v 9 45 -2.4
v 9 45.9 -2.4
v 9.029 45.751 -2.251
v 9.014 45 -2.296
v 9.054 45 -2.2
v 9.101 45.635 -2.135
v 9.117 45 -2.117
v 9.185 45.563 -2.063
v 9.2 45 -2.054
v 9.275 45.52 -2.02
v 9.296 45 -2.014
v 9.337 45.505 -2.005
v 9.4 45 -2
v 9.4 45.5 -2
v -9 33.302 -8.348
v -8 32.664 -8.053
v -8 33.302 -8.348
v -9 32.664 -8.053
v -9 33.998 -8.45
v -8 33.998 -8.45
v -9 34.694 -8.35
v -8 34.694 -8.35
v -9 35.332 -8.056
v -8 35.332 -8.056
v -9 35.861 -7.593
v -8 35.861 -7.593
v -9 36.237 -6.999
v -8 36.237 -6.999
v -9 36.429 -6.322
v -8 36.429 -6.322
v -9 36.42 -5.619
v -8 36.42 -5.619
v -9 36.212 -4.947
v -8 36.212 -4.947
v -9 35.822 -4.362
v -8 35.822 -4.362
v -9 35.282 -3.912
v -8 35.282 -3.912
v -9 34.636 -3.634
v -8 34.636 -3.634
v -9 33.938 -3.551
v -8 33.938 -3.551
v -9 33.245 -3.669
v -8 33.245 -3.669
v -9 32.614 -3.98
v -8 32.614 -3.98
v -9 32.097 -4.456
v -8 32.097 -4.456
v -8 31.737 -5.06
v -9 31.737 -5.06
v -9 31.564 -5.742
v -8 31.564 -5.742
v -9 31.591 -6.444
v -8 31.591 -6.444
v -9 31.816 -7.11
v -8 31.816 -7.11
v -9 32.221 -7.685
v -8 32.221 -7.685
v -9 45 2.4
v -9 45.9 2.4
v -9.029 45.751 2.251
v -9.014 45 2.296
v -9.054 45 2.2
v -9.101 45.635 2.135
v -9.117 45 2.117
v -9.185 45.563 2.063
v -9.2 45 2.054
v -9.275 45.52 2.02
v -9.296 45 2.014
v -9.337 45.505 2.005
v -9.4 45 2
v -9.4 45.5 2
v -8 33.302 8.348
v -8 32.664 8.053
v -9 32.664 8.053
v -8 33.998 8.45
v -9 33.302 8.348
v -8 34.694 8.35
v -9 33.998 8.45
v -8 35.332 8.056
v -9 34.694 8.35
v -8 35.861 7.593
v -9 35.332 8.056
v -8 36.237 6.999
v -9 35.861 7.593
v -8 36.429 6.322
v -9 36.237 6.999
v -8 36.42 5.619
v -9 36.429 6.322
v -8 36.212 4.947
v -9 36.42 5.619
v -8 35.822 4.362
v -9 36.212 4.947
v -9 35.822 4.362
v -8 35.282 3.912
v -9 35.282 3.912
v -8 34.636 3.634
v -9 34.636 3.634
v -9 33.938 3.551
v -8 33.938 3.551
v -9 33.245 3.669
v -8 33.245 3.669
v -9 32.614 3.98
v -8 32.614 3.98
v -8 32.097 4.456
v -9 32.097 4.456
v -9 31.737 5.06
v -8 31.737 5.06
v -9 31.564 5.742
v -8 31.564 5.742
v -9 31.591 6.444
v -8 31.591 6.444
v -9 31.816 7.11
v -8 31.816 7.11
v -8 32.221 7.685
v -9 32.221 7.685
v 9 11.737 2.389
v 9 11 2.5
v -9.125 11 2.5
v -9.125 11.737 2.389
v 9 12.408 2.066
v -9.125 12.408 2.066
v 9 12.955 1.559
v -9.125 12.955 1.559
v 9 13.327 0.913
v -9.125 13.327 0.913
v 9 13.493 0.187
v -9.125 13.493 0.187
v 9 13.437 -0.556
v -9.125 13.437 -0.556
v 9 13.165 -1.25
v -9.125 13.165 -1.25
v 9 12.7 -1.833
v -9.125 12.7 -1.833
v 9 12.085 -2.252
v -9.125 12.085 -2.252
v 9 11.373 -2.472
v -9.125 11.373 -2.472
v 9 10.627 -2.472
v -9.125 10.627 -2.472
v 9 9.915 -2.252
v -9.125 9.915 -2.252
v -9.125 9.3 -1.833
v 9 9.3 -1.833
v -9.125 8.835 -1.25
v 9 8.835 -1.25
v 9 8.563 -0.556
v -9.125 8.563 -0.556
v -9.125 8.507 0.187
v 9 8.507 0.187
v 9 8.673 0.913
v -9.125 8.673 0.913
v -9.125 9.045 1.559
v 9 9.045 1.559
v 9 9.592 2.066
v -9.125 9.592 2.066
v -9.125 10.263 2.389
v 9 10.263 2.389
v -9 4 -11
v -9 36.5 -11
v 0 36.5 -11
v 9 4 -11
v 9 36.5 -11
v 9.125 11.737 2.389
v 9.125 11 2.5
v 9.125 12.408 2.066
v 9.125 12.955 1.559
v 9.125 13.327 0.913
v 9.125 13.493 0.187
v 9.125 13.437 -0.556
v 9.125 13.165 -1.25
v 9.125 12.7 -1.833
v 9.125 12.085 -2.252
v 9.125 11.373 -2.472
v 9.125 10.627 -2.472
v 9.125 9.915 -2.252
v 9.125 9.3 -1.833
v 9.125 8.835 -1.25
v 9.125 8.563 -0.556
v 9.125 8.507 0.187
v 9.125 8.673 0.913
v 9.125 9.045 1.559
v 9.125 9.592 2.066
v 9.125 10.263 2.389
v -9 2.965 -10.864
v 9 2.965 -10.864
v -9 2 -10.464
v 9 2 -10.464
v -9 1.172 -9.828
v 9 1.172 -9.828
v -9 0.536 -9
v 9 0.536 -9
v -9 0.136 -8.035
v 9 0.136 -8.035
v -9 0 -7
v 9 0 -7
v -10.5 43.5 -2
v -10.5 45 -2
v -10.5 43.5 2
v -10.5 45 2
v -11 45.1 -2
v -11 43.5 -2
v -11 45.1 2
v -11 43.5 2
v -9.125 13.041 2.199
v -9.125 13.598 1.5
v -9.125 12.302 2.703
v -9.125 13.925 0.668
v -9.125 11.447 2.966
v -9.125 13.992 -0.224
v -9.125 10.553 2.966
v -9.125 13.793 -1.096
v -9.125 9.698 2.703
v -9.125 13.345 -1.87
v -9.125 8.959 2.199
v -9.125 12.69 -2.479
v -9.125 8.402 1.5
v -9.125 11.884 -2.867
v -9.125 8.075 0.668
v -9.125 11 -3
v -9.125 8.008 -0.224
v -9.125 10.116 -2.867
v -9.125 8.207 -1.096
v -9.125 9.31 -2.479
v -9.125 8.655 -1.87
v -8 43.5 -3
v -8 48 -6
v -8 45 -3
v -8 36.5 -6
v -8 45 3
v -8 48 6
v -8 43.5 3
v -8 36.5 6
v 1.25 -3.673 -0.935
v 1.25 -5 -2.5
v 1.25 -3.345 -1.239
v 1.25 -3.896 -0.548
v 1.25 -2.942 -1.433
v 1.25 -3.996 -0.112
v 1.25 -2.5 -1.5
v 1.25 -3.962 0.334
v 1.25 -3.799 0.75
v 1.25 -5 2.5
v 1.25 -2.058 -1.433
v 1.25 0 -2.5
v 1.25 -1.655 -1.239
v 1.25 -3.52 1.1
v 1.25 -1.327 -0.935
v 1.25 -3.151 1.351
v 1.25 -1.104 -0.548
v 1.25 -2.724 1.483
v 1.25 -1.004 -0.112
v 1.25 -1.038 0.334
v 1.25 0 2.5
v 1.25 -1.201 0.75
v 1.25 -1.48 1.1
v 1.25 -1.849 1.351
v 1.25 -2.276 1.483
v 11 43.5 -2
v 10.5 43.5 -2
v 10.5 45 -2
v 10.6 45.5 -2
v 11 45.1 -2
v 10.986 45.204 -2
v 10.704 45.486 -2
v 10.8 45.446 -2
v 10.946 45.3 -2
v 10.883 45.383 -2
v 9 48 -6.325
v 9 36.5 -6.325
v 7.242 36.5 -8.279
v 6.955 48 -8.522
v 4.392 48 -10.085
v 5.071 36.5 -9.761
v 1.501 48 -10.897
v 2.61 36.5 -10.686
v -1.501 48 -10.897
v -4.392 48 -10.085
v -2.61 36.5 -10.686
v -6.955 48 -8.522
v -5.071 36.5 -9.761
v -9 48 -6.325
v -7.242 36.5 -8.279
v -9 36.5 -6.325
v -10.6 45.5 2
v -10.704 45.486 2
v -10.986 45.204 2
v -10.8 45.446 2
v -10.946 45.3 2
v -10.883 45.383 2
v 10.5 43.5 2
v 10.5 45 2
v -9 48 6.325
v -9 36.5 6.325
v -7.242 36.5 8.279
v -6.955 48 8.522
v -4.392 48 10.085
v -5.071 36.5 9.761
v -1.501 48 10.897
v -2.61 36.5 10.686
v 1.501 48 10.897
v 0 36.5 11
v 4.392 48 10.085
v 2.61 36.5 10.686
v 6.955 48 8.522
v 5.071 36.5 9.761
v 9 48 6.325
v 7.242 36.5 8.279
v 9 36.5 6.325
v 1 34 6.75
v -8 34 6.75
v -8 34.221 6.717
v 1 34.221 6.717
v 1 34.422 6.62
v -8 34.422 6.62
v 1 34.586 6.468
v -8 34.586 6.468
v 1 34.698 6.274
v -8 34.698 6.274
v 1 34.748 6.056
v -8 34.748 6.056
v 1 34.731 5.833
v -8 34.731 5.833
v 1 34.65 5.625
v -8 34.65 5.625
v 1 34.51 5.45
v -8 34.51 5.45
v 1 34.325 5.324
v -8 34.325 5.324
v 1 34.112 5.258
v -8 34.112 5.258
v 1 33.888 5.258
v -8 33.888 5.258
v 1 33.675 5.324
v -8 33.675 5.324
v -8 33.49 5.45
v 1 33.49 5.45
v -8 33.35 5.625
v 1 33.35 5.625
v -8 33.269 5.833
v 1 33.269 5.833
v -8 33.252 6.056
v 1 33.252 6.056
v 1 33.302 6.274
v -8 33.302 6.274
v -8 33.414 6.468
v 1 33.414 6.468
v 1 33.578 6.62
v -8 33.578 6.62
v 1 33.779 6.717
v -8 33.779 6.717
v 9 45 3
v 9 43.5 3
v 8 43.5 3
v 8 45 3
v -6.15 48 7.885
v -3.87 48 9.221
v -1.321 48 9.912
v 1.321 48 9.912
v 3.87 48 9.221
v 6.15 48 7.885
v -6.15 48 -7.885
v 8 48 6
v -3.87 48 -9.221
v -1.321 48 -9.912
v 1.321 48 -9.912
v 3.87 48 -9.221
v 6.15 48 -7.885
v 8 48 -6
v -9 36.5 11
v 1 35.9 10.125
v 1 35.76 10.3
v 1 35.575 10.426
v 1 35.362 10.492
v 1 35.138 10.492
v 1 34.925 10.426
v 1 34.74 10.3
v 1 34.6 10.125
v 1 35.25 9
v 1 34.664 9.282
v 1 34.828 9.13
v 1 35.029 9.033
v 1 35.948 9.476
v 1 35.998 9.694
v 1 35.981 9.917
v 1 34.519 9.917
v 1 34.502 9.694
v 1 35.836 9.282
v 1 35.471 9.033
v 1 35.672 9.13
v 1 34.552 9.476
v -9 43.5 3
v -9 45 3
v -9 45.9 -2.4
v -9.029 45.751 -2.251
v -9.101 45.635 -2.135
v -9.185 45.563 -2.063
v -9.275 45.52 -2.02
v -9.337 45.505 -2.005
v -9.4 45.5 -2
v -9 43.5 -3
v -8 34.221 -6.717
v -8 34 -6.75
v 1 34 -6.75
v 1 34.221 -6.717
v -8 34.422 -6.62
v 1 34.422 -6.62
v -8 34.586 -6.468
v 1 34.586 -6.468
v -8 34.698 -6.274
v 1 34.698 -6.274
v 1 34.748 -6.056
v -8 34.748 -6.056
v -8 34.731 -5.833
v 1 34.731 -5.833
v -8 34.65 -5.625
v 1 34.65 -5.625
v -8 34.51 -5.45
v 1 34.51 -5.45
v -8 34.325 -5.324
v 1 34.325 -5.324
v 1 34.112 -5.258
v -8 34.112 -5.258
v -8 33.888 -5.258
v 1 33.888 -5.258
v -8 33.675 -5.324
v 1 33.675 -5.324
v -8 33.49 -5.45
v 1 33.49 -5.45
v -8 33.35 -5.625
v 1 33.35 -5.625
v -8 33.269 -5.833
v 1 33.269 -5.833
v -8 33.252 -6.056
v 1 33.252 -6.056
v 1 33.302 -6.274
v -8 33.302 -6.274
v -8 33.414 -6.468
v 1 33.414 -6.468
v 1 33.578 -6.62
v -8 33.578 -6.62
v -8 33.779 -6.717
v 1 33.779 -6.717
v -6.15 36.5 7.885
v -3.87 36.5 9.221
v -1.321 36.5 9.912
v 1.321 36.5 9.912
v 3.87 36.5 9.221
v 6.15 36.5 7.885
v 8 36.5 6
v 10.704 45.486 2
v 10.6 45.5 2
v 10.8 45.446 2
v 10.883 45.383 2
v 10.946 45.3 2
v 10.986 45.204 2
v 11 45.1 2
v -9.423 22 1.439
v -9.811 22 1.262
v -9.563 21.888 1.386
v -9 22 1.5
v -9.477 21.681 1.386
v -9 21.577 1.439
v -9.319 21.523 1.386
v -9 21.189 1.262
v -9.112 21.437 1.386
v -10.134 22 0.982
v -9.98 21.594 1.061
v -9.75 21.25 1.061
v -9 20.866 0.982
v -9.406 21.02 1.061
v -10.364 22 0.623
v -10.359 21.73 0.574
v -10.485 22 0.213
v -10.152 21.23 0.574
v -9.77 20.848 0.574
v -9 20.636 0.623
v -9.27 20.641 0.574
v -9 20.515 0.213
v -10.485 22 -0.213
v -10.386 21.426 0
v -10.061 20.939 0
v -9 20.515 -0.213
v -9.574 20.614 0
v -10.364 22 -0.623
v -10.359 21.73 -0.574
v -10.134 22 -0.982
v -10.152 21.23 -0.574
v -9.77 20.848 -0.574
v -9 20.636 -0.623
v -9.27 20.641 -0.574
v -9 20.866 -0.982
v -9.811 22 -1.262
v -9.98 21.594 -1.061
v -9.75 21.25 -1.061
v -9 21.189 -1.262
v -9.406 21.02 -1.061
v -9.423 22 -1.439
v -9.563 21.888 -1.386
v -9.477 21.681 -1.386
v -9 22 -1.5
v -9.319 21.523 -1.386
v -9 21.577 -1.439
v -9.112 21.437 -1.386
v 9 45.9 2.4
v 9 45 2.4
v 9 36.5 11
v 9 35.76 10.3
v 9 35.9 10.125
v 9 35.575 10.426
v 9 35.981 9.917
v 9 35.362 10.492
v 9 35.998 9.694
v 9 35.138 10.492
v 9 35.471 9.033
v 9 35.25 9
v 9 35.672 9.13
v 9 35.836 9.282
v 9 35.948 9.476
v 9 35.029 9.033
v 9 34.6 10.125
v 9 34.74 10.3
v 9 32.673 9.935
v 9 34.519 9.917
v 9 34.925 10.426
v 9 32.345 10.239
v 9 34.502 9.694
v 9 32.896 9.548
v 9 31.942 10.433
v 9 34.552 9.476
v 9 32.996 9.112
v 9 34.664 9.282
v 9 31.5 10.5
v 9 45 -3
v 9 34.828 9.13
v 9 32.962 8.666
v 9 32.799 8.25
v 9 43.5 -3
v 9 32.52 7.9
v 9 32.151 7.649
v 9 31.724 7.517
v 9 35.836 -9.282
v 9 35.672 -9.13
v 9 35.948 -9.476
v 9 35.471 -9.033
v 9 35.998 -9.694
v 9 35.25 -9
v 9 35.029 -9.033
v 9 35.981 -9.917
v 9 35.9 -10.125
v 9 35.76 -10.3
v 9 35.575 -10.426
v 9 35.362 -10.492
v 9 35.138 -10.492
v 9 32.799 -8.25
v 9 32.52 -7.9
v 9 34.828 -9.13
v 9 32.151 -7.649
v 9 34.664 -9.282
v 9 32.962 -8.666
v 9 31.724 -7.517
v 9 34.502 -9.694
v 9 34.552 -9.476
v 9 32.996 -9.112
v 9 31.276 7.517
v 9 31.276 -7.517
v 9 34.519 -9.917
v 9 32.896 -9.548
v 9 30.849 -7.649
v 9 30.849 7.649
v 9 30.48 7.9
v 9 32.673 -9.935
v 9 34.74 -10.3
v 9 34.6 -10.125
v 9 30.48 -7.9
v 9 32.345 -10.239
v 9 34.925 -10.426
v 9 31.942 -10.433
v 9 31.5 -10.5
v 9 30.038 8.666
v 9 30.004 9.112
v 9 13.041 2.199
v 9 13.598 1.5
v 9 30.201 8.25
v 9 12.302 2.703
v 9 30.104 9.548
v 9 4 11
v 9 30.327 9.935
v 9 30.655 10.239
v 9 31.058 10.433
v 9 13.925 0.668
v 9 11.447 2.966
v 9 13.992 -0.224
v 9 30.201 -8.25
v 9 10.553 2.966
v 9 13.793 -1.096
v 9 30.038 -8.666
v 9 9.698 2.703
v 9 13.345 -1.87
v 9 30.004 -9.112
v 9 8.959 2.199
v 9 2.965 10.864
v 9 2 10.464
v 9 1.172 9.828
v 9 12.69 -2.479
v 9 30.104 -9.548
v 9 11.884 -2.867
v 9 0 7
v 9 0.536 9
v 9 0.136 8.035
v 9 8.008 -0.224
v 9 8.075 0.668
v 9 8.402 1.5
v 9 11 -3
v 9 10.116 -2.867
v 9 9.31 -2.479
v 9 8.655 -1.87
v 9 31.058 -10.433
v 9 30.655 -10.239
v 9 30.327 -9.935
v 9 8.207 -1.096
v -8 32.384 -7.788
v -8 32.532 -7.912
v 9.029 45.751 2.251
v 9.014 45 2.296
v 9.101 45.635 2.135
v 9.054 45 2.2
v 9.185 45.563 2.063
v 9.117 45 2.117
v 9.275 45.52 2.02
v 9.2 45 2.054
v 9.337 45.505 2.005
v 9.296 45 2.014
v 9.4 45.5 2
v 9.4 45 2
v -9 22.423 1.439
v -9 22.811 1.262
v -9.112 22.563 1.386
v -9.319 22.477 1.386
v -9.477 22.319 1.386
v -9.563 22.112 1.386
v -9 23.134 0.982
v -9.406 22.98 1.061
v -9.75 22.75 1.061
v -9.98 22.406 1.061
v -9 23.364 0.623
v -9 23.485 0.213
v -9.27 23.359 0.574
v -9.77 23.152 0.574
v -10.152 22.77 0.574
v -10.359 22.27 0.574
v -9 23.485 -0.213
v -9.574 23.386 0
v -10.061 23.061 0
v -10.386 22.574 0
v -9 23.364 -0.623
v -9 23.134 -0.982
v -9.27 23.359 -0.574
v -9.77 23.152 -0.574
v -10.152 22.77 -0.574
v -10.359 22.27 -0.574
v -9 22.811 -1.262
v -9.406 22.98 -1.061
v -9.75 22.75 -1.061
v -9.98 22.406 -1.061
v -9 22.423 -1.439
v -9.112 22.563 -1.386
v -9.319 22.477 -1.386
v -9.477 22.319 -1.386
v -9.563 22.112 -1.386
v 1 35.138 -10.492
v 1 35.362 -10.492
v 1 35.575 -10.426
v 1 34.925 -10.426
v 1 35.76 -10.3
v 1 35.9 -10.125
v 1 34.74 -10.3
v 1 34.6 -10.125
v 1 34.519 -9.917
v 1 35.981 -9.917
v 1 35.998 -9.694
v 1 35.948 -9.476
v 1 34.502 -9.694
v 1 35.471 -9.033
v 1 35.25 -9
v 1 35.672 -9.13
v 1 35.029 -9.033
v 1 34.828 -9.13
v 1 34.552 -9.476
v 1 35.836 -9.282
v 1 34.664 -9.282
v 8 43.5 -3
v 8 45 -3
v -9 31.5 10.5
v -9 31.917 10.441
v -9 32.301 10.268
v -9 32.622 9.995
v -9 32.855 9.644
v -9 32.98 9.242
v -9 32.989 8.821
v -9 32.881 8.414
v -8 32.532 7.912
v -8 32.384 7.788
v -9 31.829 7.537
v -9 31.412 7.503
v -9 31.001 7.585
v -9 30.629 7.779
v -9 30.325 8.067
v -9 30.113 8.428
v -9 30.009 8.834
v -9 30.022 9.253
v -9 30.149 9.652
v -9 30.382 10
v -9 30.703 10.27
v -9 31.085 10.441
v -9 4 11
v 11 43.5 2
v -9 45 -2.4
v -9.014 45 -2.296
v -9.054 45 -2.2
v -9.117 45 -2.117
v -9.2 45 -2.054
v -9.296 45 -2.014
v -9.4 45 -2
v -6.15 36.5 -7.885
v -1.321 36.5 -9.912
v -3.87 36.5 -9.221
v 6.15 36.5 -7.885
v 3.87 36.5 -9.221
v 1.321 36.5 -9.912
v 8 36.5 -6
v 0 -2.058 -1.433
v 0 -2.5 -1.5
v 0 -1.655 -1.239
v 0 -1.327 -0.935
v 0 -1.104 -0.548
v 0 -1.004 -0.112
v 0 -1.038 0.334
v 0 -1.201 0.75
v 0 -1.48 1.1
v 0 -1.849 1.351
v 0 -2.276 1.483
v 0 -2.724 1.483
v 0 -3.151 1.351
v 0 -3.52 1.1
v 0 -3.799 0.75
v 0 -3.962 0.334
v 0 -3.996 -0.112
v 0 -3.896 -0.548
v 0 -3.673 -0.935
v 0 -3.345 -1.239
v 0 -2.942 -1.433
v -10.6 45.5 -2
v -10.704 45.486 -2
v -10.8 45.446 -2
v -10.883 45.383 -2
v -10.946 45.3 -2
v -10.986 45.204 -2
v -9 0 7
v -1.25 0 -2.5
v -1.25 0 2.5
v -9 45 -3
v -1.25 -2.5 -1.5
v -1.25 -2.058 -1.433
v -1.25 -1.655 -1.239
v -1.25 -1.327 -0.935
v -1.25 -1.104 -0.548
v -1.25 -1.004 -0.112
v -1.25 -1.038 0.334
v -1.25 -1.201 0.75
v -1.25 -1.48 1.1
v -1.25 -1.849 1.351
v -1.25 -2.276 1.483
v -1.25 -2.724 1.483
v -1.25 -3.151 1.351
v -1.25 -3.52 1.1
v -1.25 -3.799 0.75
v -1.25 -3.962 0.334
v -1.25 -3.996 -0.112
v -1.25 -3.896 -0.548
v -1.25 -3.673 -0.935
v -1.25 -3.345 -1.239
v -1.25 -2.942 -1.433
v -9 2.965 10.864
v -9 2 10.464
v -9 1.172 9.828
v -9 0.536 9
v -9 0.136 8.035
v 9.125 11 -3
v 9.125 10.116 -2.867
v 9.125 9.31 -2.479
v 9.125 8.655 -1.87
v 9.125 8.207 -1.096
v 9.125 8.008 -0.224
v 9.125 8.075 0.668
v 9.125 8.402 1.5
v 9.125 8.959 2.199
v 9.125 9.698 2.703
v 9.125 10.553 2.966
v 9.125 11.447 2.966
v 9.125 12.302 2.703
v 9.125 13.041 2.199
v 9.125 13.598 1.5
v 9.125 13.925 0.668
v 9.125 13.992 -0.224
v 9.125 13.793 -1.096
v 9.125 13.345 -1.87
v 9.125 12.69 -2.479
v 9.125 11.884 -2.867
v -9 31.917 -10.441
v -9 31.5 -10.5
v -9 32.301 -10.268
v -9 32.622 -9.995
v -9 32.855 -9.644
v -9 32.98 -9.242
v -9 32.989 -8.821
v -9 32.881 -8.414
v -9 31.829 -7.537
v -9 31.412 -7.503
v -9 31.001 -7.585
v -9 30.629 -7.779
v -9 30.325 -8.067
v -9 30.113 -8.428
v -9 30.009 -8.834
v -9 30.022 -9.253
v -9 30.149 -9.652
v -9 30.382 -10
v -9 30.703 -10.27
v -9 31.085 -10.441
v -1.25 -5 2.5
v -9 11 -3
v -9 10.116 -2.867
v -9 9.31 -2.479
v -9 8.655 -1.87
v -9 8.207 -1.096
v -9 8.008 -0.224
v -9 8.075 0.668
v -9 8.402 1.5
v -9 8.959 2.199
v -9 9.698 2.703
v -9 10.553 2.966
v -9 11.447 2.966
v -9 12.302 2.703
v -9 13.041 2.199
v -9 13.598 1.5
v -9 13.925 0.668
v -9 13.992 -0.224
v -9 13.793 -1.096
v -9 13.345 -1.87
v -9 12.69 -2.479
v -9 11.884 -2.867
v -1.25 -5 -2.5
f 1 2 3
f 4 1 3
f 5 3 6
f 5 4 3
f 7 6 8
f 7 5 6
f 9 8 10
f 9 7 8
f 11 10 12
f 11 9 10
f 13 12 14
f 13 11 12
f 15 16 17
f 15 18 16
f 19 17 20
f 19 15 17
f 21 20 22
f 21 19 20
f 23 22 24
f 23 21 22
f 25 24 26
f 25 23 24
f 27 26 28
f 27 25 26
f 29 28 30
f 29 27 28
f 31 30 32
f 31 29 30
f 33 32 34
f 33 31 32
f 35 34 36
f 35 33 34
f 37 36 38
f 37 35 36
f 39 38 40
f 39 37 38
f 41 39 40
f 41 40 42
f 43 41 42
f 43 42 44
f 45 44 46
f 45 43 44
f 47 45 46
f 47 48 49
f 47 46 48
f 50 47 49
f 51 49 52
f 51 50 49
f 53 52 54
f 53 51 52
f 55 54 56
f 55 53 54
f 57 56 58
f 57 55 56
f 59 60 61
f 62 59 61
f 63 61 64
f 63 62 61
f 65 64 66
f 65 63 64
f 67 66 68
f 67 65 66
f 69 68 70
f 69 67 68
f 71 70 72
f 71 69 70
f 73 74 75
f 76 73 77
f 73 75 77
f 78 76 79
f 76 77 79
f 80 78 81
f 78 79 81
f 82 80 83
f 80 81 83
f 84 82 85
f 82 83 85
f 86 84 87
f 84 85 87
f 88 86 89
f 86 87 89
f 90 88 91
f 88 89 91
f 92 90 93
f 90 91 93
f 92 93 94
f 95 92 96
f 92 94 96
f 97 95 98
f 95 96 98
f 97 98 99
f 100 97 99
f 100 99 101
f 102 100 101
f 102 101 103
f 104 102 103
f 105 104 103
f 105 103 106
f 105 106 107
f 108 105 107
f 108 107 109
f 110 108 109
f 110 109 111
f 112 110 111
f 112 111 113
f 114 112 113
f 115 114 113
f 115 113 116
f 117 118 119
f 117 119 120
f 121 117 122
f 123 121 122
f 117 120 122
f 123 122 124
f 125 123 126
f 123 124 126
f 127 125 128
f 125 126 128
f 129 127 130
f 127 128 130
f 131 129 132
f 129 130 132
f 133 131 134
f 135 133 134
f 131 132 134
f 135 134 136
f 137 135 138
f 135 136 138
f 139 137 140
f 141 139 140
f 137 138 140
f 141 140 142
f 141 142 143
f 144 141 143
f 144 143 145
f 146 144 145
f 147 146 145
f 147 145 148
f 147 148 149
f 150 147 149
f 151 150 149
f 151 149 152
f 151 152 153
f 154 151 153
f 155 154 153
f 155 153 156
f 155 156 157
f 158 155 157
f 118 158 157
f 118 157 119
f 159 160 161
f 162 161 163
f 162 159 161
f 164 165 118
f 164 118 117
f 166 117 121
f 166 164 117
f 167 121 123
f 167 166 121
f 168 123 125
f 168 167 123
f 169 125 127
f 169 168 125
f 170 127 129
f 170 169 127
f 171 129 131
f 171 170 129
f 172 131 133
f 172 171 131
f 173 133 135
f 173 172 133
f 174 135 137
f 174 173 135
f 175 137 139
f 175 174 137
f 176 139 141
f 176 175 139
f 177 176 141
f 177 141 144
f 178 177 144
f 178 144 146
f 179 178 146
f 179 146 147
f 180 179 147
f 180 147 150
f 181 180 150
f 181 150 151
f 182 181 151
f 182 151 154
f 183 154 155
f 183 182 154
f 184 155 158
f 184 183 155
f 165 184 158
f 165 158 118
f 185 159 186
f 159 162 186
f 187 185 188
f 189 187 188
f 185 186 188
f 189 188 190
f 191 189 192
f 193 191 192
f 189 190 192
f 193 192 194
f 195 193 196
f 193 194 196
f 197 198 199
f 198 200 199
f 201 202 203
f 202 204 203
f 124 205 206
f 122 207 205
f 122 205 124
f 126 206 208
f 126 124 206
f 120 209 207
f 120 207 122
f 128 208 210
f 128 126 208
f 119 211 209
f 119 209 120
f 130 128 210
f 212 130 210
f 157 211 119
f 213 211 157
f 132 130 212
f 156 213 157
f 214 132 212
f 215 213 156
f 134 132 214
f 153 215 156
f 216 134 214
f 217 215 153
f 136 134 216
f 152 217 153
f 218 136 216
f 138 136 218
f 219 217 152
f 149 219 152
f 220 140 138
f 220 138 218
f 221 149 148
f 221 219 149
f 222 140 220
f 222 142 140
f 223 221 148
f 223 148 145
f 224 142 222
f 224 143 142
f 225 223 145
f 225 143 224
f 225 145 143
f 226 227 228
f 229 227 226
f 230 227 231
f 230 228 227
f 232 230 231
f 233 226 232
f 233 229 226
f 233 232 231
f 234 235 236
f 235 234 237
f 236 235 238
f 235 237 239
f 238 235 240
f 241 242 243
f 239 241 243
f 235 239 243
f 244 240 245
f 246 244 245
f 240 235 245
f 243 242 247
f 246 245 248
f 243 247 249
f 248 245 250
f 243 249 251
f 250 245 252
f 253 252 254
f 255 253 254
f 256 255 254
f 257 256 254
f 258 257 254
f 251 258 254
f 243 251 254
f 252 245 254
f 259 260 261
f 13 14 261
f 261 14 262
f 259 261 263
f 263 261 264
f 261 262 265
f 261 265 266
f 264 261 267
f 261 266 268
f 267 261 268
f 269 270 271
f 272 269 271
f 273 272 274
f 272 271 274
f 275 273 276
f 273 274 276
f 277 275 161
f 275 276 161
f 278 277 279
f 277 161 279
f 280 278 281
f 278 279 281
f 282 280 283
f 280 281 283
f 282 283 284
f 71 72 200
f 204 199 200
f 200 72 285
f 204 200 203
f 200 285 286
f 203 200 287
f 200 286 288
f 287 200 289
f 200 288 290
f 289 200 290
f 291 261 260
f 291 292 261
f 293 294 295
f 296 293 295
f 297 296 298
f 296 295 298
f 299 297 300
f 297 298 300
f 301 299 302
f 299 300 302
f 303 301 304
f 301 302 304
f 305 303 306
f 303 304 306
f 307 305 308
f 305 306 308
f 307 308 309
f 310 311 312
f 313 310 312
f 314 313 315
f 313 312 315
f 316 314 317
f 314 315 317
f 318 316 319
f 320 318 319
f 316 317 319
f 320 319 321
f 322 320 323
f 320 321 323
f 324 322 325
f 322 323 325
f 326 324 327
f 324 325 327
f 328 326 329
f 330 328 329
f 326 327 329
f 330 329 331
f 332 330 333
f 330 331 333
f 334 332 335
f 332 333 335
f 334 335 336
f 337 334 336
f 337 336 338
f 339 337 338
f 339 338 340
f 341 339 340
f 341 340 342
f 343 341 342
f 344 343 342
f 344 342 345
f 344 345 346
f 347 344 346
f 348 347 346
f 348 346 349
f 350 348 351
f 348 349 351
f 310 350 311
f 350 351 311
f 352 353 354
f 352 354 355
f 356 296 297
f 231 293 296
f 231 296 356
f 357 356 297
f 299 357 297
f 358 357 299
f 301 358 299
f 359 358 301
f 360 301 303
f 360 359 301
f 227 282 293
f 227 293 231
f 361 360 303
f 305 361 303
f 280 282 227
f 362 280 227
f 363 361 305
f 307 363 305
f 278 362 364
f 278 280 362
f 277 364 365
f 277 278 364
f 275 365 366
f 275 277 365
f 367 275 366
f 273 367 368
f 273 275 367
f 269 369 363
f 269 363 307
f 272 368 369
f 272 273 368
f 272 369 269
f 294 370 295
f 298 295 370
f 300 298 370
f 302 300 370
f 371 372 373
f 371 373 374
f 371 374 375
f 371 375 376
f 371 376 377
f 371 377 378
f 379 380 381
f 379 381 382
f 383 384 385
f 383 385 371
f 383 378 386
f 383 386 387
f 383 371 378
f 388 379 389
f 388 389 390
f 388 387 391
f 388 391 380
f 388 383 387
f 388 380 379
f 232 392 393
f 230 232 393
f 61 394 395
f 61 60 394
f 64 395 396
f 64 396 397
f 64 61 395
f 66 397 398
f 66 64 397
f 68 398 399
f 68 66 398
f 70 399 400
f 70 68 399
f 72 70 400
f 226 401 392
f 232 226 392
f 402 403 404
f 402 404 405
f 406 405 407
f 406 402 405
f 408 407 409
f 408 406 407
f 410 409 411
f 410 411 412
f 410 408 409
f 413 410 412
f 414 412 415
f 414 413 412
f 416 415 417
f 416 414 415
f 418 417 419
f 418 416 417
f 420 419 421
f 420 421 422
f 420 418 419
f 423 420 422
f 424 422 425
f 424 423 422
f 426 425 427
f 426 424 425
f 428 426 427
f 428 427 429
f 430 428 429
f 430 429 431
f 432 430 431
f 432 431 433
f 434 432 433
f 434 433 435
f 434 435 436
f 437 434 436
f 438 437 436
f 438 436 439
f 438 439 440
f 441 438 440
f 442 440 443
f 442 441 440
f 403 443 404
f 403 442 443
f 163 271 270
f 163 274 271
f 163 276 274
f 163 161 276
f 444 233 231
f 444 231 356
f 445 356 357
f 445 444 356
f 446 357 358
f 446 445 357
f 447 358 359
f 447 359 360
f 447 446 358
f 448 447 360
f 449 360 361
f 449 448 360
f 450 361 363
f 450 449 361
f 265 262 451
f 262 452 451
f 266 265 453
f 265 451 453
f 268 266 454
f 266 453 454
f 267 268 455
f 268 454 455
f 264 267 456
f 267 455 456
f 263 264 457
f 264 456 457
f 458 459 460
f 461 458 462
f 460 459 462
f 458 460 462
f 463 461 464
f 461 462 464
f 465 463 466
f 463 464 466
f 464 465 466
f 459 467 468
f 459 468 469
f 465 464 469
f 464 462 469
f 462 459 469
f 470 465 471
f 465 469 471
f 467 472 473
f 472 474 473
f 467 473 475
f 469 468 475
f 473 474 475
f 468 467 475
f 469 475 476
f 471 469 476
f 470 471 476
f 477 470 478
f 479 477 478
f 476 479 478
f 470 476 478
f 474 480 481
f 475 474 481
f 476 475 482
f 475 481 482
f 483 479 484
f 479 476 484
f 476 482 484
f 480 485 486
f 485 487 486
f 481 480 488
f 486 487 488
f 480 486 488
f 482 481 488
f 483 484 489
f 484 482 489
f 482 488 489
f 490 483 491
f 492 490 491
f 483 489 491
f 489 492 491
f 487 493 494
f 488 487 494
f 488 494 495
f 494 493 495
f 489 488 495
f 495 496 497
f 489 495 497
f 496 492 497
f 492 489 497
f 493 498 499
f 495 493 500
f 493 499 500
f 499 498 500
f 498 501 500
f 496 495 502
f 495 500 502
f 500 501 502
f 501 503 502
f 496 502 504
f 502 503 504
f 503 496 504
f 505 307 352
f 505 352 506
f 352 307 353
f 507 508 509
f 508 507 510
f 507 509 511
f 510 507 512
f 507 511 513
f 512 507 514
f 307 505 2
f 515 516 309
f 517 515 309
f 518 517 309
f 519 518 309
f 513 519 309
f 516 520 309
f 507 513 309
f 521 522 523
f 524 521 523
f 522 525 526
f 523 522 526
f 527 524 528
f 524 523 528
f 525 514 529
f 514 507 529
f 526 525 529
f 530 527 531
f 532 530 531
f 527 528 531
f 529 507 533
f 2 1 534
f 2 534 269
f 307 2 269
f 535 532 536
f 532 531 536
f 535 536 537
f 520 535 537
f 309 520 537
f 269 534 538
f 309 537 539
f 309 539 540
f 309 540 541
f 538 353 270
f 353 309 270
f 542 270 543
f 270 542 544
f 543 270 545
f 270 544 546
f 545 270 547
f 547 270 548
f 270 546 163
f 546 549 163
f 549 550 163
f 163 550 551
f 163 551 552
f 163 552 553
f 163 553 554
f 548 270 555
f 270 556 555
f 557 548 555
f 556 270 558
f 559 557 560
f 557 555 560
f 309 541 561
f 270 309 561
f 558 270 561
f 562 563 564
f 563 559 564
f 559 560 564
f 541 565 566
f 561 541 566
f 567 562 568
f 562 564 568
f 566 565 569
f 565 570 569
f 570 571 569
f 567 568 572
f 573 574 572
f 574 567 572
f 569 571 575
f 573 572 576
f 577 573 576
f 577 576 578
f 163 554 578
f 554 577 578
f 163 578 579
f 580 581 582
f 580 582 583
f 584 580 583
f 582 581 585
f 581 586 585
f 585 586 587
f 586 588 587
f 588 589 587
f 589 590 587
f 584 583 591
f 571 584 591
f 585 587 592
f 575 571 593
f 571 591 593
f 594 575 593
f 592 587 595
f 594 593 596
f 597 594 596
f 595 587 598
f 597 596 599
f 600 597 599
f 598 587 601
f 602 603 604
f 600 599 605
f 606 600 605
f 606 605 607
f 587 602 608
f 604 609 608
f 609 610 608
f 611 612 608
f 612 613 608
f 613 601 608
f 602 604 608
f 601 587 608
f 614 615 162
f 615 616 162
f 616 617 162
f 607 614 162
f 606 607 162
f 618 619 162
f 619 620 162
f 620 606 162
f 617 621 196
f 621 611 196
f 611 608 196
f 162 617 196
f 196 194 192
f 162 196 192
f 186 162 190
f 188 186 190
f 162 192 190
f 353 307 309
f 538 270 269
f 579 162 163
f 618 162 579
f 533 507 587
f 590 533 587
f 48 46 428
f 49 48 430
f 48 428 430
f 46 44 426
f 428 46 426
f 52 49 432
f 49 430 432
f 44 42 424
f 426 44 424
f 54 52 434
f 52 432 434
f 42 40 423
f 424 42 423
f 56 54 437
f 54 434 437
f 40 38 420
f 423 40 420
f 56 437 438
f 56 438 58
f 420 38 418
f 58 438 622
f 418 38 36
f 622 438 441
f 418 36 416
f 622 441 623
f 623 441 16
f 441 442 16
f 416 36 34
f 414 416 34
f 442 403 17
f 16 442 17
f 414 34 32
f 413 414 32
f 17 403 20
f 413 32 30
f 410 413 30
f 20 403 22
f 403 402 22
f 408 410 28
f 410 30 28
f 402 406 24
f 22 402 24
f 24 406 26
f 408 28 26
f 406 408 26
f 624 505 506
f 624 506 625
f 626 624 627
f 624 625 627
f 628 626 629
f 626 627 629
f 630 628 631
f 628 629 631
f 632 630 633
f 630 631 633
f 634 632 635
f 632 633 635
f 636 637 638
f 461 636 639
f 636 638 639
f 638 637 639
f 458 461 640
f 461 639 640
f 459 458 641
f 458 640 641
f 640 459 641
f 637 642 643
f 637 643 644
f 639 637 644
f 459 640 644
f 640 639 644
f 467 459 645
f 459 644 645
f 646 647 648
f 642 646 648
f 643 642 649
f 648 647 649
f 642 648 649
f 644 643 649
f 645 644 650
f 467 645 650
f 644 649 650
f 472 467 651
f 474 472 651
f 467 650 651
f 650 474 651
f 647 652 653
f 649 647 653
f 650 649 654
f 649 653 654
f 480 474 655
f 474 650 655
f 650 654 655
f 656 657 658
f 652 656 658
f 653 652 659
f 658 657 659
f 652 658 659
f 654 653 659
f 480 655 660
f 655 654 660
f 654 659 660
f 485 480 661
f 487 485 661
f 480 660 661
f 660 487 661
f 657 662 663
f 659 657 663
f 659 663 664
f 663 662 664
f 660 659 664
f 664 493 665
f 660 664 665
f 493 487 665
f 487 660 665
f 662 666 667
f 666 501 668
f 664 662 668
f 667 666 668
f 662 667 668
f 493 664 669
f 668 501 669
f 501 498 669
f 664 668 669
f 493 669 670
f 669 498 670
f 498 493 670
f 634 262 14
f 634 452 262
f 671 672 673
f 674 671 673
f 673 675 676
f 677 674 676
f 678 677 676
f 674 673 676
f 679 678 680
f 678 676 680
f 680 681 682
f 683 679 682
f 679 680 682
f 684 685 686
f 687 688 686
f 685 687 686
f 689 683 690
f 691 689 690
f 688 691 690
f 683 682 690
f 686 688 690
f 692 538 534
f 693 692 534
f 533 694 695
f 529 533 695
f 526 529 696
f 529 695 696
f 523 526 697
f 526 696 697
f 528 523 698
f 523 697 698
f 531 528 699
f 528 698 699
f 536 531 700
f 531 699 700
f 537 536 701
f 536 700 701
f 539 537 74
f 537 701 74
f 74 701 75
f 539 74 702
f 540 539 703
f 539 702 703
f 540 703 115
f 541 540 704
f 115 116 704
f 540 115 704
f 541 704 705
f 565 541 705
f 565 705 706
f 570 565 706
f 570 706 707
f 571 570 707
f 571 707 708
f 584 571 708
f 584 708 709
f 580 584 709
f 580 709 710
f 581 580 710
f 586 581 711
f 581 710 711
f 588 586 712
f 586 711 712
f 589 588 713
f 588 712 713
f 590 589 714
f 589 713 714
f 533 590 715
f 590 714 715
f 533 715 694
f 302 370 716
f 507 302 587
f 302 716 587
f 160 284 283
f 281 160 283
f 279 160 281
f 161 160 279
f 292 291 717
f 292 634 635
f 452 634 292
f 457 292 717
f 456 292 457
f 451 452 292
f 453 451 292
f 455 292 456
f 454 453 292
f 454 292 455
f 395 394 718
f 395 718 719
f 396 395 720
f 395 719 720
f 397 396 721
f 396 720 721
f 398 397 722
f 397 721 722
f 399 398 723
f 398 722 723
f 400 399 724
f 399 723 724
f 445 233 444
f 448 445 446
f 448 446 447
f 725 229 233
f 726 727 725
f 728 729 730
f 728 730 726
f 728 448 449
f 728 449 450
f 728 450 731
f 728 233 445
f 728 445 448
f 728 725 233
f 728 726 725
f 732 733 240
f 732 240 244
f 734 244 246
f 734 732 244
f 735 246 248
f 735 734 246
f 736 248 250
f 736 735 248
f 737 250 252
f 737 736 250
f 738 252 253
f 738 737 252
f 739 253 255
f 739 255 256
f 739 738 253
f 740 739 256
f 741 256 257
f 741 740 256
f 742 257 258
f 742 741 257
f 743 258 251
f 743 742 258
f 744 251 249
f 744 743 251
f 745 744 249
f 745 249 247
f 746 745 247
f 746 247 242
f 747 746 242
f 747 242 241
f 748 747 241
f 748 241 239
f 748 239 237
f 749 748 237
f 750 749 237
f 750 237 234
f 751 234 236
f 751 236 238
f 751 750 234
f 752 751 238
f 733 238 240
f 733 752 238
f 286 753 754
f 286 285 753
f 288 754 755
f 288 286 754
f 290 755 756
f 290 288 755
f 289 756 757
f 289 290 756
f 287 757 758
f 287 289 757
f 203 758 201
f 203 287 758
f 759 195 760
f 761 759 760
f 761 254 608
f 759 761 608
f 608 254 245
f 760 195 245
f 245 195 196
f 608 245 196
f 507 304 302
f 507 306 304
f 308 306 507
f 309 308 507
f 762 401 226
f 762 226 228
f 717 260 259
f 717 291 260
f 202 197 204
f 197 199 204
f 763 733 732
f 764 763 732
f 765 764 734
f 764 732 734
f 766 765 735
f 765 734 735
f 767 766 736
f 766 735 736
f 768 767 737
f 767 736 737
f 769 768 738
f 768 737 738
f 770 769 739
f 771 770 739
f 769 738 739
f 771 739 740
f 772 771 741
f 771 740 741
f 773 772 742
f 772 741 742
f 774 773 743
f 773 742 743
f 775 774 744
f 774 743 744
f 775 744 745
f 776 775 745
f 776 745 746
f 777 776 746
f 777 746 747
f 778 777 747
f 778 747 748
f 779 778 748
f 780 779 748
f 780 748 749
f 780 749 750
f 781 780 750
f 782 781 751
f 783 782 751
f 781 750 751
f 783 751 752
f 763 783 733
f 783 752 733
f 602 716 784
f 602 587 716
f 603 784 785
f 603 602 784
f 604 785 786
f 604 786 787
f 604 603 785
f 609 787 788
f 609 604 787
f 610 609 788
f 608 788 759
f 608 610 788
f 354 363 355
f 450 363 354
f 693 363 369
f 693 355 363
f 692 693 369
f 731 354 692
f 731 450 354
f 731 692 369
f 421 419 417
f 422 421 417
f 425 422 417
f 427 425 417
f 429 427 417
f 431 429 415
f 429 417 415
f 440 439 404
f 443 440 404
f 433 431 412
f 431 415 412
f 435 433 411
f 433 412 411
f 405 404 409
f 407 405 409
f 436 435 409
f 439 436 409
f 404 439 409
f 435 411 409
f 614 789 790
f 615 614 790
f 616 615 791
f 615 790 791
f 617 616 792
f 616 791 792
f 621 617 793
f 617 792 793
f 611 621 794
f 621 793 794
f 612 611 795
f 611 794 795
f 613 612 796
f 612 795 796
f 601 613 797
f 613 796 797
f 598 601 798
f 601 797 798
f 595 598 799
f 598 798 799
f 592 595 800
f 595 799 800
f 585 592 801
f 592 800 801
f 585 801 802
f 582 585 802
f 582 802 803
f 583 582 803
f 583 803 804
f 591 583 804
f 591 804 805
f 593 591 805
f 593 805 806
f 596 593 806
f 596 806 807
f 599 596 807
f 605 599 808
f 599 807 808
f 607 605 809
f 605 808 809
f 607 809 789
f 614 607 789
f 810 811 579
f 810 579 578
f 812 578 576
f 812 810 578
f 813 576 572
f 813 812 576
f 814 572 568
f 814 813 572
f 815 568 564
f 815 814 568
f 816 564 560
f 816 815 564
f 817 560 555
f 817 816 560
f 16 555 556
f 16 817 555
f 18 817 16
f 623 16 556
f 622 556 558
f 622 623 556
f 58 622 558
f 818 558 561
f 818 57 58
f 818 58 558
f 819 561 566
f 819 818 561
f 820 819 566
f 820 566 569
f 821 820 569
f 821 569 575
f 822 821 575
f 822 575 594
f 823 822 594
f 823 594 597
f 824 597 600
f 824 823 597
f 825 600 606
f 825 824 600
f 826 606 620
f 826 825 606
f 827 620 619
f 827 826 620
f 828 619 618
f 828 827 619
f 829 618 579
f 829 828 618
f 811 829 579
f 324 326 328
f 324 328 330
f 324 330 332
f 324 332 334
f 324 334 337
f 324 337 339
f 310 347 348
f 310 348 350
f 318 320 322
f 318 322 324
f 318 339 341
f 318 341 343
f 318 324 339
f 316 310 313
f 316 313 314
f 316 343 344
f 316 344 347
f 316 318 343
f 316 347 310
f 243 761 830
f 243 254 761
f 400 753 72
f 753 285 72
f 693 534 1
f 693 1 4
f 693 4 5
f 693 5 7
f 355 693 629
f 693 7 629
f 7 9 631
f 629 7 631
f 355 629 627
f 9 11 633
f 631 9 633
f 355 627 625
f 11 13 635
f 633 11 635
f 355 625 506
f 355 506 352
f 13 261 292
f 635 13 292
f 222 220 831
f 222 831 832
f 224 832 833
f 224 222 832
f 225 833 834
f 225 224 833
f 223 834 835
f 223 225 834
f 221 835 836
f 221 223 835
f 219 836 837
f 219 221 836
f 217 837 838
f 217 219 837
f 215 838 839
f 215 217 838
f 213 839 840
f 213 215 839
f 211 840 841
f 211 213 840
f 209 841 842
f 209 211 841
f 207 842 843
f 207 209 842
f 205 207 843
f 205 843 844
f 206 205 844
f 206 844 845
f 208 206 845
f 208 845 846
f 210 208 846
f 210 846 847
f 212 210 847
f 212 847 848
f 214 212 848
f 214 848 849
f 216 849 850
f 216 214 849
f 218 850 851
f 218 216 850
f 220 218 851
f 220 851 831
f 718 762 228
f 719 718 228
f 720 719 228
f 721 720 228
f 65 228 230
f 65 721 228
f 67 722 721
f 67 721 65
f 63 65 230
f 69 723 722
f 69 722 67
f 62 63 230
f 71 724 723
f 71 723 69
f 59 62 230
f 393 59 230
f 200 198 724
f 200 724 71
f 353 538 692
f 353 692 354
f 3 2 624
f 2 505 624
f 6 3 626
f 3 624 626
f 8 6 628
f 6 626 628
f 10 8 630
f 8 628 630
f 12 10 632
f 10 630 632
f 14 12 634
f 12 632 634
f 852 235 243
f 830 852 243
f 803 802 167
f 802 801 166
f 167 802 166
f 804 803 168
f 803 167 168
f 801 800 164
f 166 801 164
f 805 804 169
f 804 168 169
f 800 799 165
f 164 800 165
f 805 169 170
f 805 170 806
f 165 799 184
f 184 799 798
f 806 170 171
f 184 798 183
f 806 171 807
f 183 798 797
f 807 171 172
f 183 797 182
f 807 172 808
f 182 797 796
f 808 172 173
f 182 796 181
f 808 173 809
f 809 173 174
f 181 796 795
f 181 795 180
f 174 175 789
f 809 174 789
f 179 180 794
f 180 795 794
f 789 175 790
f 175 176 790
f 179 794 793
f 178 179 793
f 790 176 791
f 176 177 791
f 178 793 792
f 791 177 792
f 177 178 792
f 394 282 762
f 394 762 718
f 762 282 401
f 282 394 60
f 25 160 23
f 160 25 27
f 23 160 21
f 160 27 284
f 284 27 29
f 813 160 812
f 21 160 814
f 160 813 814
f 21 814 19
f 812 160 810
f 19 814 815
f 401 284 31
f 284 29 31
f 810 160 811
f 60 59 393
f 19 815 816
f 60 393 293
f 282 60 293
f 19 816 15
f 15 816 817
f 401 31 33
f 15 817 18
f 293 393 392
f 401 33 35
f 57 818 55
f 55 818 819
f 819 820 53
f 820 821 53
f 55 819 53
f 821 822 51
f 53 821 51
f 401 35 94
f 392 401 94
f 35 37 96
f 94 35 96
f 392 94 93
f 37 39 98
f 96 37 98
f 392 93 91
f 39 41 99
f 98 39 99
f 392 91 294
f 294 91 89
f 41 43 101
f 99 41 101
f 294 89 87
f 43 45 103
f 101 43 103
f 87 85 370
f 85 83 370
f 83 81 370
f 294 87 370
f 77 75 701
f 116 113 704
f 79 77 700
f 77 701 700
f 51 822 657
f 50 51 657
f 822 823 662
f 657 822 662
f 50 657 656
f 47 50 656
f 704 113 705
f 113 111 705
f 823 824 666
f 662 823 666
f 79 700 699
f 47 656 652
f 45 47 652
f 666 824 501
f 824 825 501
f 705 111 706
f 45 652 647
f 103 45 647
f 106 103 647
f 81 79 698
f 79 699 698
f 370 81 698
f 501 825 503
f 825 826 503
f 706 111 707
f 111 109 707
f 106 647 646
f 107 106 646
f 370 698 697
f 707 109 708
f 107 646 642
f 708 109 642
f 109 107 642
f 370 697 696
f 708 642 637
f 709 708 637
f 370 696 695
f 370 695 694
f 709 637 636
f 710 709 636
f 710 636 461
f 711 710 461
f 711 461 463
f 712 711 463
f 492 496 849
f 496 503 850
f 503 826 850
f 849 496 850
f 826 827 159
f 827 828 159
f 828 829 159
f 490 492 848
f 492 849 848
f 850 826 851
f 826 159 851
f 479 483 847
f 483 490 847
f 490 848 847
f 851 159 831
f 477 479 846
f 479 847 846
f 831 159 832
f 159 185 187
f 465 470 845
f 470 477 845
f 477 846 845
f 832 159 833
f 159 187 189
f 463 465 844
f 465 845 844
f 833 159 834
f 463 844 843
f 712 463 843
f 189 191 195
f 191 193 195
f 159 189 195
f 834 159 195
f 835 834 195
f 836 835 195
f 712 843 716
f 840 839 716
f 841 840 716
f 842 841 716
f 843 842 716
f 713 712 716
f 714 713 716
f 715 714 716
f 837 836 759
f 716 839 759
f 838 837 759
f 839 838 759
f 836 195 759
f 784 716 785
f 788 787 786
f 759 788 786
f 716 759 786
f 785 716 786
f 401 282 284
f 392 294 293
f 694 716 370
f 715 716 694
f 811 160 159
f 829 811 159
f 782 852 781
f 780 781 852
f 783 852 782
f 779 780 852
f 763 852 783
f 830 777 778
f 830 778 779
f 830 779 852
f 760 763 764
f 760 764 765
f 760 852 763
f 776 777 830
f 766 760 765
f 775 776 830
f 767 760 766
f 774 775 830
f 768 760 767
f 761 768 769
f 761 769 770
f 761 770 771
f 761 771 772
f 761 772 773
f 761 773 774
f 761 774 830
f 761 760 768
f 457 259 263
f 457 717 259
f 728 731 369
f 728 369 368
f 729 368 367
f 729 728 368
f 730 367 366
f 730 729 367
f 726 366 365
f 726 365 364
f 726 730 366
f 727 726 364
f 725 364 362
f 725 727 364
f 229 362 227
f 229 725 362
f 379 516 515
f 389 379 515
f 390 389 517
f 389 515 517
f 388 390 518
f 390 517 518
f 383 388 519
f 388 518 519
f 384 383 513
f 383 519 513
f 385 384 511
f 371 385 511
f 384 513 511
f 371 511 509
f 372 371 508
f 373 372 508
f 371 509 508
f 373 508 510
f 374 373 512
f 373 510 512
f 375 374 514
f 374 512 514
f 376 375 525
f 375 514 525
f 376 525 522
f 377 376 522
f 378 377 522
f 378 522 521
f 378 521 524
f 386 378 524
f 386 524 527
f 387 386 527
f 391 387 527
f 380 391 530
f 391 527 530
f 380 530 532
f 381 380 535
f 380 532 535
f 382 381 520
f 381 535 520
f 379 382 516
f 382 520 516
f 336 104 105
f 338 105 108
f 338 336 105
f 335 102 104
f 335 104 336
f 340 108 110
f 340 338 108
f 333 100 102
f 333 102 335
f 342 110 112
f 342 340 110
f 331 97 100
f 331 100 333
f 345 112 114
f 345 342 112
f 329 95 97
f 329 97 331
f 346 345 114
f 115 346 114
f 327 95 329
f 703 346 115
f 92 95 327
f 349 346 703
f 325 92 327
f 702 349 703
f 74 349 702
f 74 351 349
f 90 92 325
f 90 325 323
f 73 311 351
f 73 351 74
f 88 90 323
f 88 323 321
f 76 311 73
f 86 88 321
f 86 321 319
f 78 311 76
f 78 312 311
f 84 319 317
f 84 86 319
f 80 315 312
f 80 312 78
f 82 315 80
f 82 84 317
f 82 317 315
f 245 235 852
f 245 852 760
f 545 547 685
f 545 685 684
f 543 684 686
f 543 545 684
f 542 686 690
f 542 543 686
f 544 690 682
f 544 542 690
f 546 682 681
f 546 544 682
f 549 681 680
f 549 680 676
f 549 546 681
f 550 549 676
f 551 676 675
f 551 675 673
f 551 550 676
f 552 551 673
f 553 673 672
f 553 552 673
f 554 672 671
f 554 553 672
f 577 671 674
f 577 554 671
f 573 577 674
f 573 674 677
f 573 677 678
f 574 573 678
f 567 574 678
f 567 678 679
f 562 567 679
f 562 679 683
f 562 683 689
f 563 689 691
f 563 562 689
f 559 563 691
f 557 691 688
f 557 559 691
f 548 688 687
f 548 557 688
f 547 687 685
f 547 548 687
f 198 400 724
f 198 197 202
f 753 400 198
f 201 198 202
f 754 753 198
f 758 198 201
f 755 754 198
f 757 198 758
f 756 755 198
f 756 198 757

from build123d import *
from build123d.topology import SkipClean

# Parameters (mm, degrees)
SKETCH1_W           = 18
SKETCH1_H           = 22
BOSS_EXTRUDE1_DEPTH = 36.5
FILLET1_R           = 4
BOSS_EXTRUDE2_DEPTH = 11.5
BOSS_EXTRUDE3_DEPTH = 2
SKETCH4_W           = 6
SKETCH4_H           = 1.5
CUT_EXTRUDE1_DEPTH  = 4
FILLET2_R           = 0.4
FILLET3_R           = 0.4
FILLET4_R           = 0.4
SKETCH5_R           = 1.5
CUT_EXTRUDE2_DEPTH  = 54.150729064
SKETCH5_3_R         = 1.5
SKETCH5_3_R_2       = 2.45
SKETCH5_3_R_3       = 2
CUT_EXTRUDE3_DEPTH  = 1
SKETCH6_R           = 0.75
CUT_EXTRUDE4_DEPTH  = 9
SKETCH7_R           = 0.75
CUT_EXTRUDE5_DEPTH  = 8
SKETCH8_R           = 2.5
CUT_EXTRUDE6_DEPTH  = 54.150729064
BOSS_EXTRUDE4_START = 0.125
SKETCH8_3_R         = 3
SKETCH8_3_R_2       = 2.5
BOSS_EXTRUDE4_DEPTH = 0.125
SKETCH11_R          = 1.5
BOSS_EXTRUDE5_DEPTH = 1.25


with BuildPart() as part:
    # Sketch1 → Boss-Extrude1 (new body)
    with BuildSketch(Plane(origin=(0, 0, 0), x_dir=(1, 0, 0), z_dir=(0, 1, 0))):
        Rectangle(SKETCH1_W, SKETCH1_H)
    extrude(amount=BOSS_EXTRUDE1_DEPTH)

    # Fillet1
    fillet1_edges = [part.edges().sort_by_distance(p)[0] for p in [
        (0, 0, 11),
        (0, 0, -11),
    ]]
    fillet(fillet1_edges, radius=FILLET1_R)

    # Sketch2 → Boss-Extrude2 (add)
    with BuildSketch(Plane(origin=(0, 36.5, 0), x_dir=(1, 0, 0), z_dir=(0, 1, 0))):
        with BuildLine():
            Line((-9, 6.32455532), (-9, -6.32455532))
            ThreePointArc((-9, -6.32455532), (0, -11), (9, -6.32455532))
            Line((9, -6.32455532), (9, 6.32455532))
            ThreePointArc((9, 6.32455532), (0, 11), (-9, 6.32455532))
        make_face()
        with BuildLine():
            Line((-8, 6), (-8, -6))
            ThreePointArc((-8, -6), (0, -10), (8, -6))
            Line((8, -6), (8, 6))
            ThreePointArc((8, 6), (0, 10), (-8, 6))
        make_face(mode=Mode.SUBTRACT)
    extrude(amount=BOSS_EXTRUDE2_DEPTH)

    # Sketch3 → Boss-Extrude3 (add, symmetric)
    with BuildSketch(Plane.XY):
        Polygon((-9, 45), (-10.5, 45), (-10.5, 43.5), (-11, 43.5), (-11, 45.5), (-9, 45.5), align=None)
    boss_extrude3 = extrude(amount=BOSS_EXTRUDE3_DEPTH, both=True)

    # Sketch4 → Cut-Extrude1 (cut)
    with BuildSketch(Plane.ZY.offset(9)):
        with Locations((0, 44.25)):
            Rectangle(SKETCH4_W, SKETCH4_H)
    cut_extrude1 = extrude(amount=-CUT_EXTRUDE1_DEPTH, mode=Mode.SUBTRACT)

    # Fillet2
    fillet2_edges = [part.edges().sort_by_distance(p)[0] for p in [
        (-9, 45.25, -2),
        (-9, 45.5, 0),
        (-9, 45.25, 2),
    ]]
    fillet(fillet2_edges, radius=FILLET2_R)

    # Fillet3
    fillet3_edges = [part.edges().sort_by_distance(p)[0] for p in [
        (-11, 45.5, 0),
    ]]
    fillet(fillet3_edges, radius=FILLET3_R)

    # Mirror1: Boss-Extrude3, Cut-Extrude1 across plane
    add(boss_extrude3.mirror(Plane(origin=(0, 0, 0), x_dir=(0, 0, 1), z_dir=(1, 0, 0))))
    add(cut_extrude1.mirror(Plane(origin=(0, 0, 0), x_dir=(0, 0, 1), z_dir=(1, 0, 0))), mode=Mode.SUBTRACT)

    # Fillet4
    fillet4_edges = [part.edges().sort_by_distance(p)[0] for p in [
        (9, 45.25, 2),
        (9, 45.5, 0),
        (11, 45.5, 0),
        (9, 45.25, -2),
    ]]
    fillet(fillet4_edges, radius=FILLET4_R)

    # Sketch5 → Cut-Extrude2 (cut, through all)
    with BuildSketch(Plane.ZY.offset(9)):
        with Locations((9, 31.5)):
            Circle(SKETCH5_R)
    cut_extrude2 = extrude(amount=-CUT_EXTRUDE2_DEPTH, mode=Mode.SUBTRACT)

    # Sketch5<3> → Cut-Extrude3 (cut)
    # profile 1 of 5: a face of its own
    with BuildSketch(Plane.ZY.offset(9)):
        with Locations((9, 31.5)):
            Circle(SKETCH5_3_R)
    # profile 2 of 5: a face of its own
    with BuildSketch(Plane.ZY.offset(9)):
        with Locations((6, 34)):
            Circle(SKETCH5_3_R_2)
        with Locations((6, 34)):
            Circle(SKETCH5_3_R_3, mode=Mode.SUBTRACT)
    # profile 3 of 5: a face of its own
    with BuildSketch(Plane.ZY.offset(9)):
        with Locations((6, 34)):
            Circle(SKETCH5_3_R_3)
    # profile 4 of 5: a face of its own
    with BuildSketch(Plane.ZY.offset(9)):
        with Locations((9, 31.5)):
            Circle(SKETCH5_3_R)
    # profile 5 of 5: a face of its own
    with BuildSketch(Plane.ZY.offset(9)):
        with Locations((6, 34)):
            Circle(SKETCH5_3_R_2)
    cut_extrude3 = extrude(amount=-CUT_EXTRUDE3_DEPTH, mode=Mode.SUBTRACT)

    # Sketch6 → Cut-Extrude4 (cut)
    with BuildSketch(Plane.ZY.offset(8)):
        with Locations((6, 34)):
            Circle(SKETCH6_R)
    cut_extrude4 = extrude(amount=-CUT_EXTRUDE4_DEPTH, mode=Mode.SUBTRACT)

    # Mirror4: Cut-Extrude2, Cut-Extrude3, Cut-Extrude4 across plane
    add(cut_extrude2.mirror(Plane.XY), mode=Mode.SUBTRACT)
    add(cut_extrude3.mirror(Plane.XY), mode=Mode.SUBTRACT)
    add(cut_extrude4.mirror(Plane.XY), mode=Mode.SUBTRACT)

    # Sketch7 → Cut-Extrude5 (cut)
    with BuildSketch(Plane(origin=(9, 0, 0), x_dir=(0, 0, -1), z_dir=(1, 0, 0))):
        with Locations((-9.75, 35.25)):
            Circle(SKETCH7_R)
    cut_extrude5 = extrude(amount=-CUT_EXTRUDE5_DEPTH, mode=Mode.SUBTRACT)

    # Mirror5: Cut-Extrude5 across plane
    add(cut_extrude5.mirror(Plane.XY), mode=Mode.SUBTRACT)

    # Sketch8 → Cut-Extrude6 (cut, through all)
    with BuildSketch(Plane.ZY.offset(9)):
        with Locations((0, 11)):
            Circle(SKETCH8_R)
    extrude(amount=-CUT_EXTRUDE6_DEPTH, mode=Mode.SUBTRACT)

    # Sketch8<3> → Boss-Extrude4 (add)
    with BuildSketch(Plane.ZY.offset(9).offset(BOSS_EXTRUDE4_START)):
        with Locations(Location((0, 11, 0), (0, 0, 180))):
            Circle(SKETCH8_3_R)
        with Locations((0, 11)):
            Circle(SKETCH8_3_R_2, mode=Mode.SUBTRACT)
    boss_extrude4 = extrude(amount=-BOSS_EXTRUDE4_DEPTH)

    # Sketch9 → Revolve1 (revolve)
    with SkipClean():  # the faces are left unmerged after this step: merging them gives an invalid solid
        with BuildSketch(Plane(origin=(0, 22, 0), x_dir=(-1, 0, 0), z_dir=(0, -1, 0))):
            with BuildLine():
                Line((9, 1.5), (9, -1.5))
                ThreePointArc((9, -1.5), (10.5, 0), (9, 1.5))
            make_face()
        revolve(axis=Axis((-9, 22, -1.5), (0, 0, 1)))

    # Mirror6: Boss-Extrude4 across plane
    with SkipClean():  # the faces are left unmerged after this step: merging them gives an invalid solid
        add(boss_extrude4.mirror(Plane(origin=(0, 0, 0), x_dir=(0, 0, 1), z_dir=(1, 0, 0))))

    # Sketch11 → Boss-Extrude5 (add, symmetric)
    with SkipClean():  # the faces are left unmerged after this step: merging them gives an invalid solid
        with BuildSketch(Plane(origin=(0, 0, 0), x_dir=(0, 0, -1), z_dir=(1, 0, 0))):
            Polygon((-2.5, -2.810816006), (-2.5, 0), (2.5, 0), (2.5, -2.810816006), (2.5, -5), (-2.5, -5), align=None)
            with Locations((0, -2.5)):
                Circle(SKETCH11_R, mode=Mode.SUBTRACT)
        extrude(amount=BOSS_EXTRUDE5_DEPTH, both=True)


solid = part.part
